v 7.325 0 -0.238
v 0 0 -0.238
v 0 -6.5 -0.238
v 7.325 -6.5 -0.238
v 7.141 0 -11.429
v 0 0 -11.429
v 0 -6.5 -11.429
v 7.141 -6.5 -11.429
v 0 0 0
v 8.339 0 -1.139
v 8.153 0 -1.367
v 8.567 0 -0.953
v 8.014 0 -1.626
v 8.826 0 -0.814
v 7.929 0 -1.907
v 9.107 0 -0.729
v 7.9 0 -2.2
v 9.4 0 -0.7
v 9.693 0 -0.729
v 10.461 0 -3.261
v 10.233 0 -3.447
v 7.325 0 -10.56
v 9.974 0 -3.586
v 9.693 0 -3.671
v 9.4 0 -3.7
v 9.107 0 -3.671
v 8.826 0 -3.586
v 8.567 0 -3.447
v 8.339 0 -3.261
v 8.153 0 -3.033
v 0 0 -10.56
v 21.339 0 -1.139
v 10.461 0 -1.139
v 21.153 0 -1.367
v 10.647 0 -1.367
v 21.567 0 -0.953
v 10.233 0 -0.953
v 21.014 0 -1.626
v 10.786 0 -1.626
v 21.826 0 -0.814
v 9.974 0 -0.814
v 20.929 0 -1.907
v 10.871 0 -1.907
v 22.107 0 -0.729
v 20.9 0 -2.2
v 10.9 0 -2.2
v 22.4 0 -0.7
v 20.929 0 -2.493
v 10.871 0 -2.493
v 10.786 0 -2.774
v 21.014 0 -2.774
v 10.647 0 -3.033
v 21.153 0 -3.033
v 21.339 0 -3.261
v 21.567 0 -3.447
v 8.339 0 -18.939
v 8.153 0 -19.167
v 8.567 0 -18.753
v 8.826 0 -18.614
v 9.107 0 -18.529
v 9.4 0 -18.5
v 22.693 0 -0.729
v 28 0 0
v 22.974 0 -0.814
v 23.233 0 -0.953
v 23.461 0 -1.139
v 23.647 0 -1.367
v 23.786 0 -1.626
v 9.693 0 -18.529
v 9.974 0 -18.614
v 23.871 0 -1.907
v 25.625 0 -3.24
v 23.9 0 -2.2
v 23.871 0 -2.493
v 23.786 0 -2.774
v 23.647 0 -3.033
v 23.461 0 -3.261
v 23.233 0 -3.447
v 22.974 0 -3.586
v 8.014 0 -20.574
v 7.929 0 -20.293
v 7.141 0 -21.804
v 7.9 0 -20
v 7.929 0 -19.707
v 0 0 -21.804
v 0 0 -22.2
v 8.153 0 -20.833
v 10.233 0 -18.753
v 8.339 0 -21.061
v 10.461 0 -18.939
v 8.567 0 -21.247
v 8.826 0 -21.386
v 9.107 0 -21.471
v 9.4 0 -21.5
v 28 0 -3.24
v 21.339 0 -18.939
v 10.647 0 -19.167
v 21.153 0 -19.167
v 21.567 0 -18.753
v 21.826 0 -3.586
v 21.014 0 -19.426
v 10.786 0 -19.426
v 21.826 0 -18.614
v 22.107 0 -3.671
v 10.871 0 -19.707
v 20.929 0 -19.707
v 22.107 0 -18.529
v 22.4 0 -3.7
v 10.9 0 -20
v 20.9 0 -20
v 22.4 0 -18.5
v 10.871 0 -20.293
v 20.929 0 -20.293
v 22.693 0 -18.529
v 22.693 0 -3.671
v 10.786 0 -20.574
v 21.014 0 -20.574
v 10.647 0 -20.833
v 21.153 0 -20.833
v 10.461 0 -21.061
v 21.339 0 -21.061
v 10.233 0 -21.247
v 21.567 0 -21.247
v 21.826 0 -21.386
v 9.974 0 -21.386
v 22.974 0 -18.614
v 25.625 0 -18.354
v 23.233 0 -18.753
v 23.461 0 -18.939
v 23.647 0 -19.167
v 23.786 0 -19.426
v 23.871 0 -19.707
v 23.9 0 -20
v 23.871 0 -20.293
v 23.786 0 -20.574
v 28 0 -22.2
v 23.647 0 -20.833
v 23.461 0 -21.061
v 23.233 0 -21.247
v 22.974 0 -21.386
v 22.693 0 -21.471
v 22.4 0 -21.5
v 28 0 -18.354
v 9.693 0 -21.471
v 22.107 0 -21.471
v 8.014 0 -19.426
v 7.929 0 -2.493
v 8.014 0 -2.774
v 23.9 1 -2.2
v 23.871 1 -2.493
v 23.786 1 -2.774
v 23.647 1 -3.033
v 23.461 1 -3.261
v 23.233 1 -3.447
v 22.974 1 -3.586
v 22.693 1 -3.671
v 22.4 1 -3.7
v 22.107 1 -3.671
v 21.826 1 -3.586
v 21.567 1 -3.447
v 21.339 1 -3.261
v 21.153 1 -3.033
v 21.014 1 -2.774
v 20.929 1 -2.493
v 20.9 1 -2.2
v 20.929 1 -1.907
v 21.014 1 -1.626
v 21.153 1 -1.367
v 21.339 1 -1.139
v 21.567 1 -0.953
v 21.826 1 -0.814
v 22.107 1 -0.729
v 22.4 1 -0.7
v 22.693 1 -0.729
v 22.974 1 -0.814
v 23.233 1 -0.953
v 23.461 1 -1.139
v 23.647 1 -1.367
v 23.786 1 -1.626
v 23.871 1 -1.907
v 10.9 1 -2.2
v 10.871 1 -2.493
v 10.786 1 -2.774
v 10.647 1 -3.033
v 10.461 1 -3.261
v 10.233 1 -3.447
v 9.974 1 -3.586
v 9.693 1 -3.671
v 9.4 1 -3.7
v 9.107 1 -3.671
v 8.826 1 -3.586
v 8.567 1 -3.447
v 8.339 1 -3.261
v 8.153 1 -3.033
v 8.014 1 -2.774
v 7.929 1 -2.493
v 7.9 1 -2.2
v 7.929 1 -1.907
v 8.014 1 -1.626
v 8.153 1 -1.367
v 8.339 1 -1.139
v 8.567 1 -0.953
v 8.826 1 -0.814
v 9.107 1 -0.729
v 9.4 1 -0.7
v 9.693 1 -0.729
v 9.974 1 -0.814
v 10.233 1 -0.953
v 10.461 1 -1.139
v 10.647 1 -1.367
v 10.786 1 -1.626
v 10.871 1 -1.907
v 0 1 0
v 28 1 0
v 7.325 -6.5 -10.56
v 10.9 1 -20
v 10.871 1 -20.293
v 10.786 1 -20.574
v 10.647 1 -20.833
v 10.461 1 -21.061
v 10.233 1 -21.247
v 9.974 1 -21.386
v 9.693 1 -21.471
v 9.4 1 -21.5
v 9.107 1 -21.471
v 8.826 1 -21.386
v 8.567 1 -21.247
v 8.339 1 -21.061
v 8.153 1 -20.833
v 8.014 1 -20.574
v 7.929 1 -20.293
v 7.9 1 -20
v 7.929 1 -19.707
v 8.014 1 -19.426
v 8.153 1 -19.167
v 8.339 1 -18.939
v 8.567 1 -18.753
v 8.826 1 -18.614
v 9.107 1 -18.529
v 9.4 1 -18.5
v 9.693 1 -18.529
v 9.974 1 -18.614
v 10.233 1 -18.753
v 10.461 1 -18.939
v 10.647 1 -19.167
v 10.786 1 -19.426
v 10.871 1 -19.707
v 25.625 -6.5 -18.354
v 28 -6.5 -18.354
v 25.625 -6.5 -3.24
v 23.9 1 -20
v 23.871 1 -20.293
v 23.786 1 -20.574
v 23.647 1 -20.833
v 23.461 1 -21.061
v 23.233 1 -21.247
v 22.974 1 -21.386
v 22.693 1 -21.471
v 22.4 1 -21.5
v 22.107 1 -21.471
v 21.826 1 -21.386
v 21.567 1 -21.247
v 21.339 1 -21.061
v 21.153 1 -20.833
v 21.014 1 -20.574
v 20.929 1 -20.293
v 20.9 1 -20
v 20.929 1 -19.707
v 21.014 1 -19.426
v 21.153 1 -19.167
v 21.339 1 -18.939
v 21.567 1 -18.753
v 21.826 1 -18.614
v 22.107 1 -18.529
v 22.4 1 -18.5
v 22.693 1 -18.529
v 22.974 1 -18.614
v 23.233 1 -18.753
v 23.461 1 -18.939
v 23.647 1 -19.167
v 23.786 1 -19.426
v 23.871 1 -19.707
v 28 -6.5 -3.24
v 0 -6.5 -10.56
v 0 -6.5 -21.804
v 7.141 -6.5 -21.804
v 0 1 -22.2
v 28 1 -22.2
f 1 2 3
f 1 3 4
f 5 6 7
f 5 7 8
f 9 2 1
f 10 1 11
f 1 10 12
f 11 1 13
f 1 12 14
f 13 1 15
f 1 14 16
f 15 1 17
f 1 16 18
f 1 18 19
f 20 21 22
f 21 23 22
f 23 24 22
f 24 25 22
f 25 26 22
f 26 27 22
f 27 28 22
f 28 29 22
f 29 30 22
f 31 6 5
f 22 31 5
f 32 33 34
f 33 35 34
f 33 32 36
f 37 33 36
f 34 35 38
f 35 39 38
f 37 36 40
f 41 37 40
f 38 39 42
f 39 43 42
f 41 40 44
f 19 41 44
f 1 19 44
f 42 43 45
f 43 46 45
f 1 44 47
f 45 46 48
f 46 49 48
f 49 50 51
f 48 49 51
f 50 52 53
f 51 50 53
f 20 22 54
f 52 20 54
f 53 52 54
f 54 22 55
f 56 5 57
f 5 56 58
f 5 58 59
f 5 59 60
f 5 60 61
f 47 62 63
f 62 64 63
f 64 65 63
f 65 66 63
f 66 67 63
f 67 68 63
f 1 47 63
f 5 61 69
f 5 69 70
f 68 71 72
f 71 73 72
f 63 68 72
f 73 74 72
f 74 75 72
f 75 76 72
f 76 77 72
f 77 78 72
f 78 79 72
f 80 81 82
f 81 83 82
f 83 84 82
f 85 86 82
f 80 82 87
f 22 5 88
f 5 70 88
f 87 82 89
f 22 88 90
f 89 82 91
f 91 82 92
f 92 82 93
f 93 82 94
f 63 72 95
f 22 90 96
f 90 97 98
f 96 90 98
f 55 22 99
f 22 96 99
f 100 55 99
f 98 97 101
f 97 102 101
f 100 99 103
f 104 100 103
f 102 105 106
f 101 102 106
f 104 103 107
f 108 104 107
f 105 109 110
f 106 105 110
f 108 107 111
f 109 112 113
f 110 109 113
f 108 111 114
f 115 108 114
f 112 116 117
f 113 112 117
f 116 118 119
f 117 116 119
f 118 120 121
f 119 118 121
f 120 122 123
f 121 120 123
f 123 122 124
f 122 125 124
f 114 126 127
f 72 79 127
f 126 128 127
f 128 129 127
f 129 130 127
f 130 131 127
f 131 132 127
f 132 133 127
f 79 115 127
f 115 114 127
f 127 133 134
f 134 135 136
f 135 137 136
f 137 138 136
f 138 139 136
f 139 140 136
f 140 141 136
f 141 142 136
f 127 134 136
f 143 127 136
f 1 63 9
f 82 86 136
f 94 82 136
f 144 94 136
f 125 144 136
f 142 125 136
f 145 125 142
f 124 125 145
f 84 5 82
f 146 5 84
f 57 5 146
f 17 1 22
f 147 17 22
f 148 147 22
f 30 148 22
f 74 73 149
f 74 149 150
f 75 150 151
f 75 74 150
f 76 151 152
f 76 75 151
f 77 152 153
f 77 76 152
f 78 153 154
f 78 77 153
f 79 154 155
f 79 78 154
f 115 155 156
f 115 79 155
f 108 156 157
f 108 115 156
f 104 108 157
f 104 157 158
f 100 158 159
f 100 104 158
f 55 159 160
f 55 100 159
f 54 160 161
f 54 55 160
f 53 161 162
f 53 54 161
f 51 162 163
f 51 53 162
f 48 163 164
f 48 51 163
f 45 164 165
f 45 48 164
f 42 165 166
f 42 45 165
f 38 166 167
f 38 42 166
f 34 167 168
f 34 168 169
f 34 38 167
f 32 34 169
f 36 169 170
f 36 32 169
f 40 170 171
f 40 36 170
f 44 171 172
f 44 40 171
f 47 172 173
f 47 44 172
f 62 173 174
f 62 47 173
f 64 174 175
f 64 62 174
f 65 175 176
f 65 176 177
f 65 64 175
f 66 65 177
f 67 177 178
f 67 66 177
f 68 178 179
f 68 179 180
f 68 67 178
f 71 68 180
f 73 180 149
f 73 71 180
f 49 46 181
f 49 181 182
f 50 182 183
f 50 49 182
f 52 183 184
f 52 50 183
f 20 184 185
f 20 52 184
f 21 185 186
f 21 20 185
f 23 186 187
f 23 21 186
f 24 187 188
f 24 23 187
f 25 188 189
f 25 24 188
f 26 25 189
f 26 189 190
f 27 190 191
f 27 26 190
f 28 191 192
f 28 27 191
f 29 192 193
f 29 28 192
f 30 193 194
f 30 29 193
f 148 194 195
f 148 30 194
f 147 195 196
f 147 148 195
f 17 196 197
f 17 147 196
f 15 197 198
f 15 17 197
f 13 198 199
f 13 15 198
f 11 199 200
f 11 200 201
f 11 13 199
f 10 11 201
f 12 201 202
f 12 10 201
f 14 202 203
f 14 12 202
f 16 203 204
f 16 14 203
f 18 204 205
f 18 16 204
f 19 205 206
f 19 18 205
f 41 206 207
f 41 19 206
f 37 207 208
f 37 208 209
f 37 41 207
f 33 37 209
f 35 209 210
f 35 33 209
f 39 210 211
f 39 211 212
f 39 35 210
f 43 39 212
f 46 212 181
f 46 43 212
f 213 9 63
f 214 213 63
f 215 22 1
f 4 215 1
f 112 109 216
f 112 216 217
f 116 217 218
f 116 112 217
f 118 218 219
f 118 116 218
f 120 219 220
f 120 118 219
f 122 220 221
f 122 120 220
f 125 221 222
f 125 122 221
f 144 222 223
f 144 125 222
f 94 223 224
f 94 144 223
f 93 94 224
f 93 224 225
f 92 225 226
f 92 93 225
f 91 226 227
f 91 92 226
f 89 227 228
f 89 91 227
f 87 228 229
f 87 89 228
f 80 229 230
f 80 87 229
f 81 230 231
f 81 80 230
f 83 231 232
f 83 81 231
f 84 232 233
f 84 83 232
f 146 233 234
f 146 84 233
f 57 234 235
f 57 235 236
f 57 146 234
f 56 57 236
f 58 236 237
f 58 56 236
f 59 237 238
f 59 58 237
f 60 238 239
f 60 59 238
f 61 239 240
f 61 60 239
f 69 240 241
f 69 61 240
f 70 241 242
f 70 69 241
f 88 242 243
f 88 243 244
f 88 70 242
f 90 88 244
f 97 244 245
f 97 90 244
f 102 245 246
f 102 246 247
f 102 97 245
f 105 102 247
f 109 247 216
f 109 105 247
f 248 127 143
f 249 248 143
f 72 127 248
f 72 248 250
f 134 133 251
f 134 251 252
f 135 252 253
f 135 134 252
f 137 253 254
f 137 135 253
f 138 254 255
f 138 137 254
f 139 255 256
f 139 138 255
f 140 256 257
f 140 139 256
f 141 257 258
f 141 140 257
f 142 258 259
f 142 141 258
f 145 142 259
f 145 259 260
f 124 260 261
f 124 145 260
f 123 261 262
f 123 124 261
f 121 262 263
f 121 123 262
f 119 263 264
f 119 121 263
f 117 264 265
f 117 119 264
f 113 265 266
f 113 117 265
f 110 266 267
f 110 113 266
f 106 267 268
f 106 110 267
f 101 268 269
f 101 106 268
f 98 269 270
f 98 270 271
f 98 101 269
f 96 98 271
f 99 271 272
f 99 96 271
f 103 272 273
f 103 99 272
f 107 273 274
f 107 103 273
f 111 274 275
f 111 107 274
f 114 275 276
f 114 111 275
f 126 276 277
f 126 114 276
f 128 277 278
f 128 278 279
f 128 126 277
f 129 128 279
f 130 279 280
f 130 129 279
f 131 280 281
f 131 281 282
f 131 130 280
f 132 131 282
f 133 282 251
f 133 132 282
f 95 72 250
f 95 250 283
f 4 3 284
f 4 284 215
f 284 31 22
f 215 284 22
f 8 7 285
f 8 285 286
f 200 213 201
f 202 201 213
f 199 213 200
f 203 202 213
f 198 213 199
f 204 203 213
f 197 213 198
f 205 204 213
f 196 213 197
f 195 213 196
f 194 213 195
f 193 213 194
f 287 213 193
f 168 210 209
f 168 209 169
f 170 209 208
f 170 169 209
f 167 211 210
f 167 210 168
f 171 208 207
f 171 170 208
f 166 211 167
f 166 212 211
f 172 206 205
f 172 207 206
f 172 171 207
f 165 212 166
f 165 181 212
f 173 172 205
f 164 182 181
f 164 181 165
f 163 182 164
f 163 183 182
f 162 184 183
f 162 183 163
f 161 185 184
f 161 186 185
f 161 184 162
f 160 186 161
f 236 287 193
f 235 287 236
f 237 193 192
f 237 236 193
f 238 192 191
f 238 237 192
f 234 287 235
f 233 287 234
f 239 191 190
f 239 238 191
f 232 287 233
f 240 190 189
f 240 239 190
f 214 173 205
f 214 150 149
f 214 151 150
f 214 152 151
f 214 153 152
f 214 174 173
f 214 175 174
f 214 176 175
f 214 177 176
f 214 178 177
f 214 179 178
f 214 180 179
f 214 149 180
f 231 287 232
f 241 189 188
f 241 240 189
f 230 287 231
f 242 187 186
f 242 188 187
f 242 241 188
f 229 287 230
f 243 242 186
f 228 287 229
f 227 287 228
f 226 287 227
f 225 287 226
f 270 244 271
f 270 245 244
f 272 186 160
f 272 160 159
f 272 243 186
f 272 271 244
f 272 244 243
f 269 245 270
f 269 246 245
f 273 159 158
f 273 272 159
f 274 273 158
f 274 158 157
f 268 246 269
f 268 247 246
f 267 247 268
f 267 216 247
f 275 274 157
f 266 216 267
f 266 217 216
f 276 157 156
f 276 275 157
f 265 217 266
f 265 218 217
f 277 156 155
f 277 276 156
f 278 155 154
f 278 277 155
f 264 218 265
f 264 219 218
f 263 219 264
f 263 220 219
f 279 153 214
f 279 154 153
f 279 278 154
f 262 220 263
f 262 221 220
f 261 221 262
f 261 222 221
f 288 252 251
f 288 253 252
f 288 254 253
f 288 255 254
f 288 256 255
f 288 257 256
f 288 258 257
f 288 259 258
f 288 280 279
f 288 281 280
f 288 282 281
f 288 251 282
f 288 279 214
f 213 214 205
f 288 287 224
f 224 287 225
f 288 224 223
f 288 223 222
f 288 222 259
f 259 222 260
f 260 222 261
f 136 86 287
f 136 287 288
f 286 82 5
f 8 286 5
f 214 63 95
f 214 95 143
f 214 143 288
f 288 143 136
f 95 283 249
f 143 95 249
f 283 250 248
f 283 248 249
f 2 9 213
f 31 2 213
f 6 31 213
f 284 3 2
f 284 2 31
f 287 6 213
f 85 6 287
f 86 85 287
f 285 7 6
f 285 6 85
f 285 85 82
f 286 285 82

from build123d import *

# Parameters (mm, degrees)
SKETCH1_W           = 28
SKETCH1_H           = 22.2
SKETCH1_R           = 1.5
BOSS_EXTRUDE1_DEPTH = 1
SKETCH2_W           = 7.140567323
SKETCH2_H           = 10.37472735
SKETCH2_W_2         = 7.324889891
SKETCH2_H_2         = 10.322063759
SKETCH2_W_3         = 2.374512373
SKETCH2_H_3         = 15.114450504
BOSS_EXTRUDE2_DEPTH = 6.5


with BuildPart() as part:
    # Sketch1 → Boss-Extrude1 (new body)
    with BuildSketch(Plane(origin=(0, 0, 0), x_dir=(1, 0, 0), z_dir=(0, 1, 0))):
        with Locations((14, 11.1)):
            Rectangle(SKETCH1_W, SKETCH1_H)
        with Locations((9.4, 20)):
            Circle(SKETCH1_R, mode=Mode.SUBTRACT)
        with Locations((22.4, 20)):
            Circle(SKETCH1_R, mode=Mode.SUBTRACT)
        with Locations((22.4, 2.2)):
            Circle(SKETCH1_R, mode=Mode.SUBTRACT)
        with Locations((9.4, 2.2)):
            Circle(SKETCH1_R, mode=Mode.SUBTRACT)
    extrude(amount=BOSS_EXTRUDE1_DEPTH)

    # Sketch2 → Boss-Extrude2 (add)
    with BuildSketch(Plane.XZ):
        with Locations((3.570283662, -16.616511116)):
            Rectangle(SKETCH2_W, SKETCH2_H)
        with Locations((3.662444946, -5.399166316)):
            Rectangle(SKETCH2_W_2, SKETCH2_H_2)
        with Locations((26.812743813, -10.797184354)):
            Rectangle(SKETCH2_W_3, SKETCH2_H_3)
    extrude(amount=BOSS_EXTRUDE2_DEPTH)


solid = part.part
